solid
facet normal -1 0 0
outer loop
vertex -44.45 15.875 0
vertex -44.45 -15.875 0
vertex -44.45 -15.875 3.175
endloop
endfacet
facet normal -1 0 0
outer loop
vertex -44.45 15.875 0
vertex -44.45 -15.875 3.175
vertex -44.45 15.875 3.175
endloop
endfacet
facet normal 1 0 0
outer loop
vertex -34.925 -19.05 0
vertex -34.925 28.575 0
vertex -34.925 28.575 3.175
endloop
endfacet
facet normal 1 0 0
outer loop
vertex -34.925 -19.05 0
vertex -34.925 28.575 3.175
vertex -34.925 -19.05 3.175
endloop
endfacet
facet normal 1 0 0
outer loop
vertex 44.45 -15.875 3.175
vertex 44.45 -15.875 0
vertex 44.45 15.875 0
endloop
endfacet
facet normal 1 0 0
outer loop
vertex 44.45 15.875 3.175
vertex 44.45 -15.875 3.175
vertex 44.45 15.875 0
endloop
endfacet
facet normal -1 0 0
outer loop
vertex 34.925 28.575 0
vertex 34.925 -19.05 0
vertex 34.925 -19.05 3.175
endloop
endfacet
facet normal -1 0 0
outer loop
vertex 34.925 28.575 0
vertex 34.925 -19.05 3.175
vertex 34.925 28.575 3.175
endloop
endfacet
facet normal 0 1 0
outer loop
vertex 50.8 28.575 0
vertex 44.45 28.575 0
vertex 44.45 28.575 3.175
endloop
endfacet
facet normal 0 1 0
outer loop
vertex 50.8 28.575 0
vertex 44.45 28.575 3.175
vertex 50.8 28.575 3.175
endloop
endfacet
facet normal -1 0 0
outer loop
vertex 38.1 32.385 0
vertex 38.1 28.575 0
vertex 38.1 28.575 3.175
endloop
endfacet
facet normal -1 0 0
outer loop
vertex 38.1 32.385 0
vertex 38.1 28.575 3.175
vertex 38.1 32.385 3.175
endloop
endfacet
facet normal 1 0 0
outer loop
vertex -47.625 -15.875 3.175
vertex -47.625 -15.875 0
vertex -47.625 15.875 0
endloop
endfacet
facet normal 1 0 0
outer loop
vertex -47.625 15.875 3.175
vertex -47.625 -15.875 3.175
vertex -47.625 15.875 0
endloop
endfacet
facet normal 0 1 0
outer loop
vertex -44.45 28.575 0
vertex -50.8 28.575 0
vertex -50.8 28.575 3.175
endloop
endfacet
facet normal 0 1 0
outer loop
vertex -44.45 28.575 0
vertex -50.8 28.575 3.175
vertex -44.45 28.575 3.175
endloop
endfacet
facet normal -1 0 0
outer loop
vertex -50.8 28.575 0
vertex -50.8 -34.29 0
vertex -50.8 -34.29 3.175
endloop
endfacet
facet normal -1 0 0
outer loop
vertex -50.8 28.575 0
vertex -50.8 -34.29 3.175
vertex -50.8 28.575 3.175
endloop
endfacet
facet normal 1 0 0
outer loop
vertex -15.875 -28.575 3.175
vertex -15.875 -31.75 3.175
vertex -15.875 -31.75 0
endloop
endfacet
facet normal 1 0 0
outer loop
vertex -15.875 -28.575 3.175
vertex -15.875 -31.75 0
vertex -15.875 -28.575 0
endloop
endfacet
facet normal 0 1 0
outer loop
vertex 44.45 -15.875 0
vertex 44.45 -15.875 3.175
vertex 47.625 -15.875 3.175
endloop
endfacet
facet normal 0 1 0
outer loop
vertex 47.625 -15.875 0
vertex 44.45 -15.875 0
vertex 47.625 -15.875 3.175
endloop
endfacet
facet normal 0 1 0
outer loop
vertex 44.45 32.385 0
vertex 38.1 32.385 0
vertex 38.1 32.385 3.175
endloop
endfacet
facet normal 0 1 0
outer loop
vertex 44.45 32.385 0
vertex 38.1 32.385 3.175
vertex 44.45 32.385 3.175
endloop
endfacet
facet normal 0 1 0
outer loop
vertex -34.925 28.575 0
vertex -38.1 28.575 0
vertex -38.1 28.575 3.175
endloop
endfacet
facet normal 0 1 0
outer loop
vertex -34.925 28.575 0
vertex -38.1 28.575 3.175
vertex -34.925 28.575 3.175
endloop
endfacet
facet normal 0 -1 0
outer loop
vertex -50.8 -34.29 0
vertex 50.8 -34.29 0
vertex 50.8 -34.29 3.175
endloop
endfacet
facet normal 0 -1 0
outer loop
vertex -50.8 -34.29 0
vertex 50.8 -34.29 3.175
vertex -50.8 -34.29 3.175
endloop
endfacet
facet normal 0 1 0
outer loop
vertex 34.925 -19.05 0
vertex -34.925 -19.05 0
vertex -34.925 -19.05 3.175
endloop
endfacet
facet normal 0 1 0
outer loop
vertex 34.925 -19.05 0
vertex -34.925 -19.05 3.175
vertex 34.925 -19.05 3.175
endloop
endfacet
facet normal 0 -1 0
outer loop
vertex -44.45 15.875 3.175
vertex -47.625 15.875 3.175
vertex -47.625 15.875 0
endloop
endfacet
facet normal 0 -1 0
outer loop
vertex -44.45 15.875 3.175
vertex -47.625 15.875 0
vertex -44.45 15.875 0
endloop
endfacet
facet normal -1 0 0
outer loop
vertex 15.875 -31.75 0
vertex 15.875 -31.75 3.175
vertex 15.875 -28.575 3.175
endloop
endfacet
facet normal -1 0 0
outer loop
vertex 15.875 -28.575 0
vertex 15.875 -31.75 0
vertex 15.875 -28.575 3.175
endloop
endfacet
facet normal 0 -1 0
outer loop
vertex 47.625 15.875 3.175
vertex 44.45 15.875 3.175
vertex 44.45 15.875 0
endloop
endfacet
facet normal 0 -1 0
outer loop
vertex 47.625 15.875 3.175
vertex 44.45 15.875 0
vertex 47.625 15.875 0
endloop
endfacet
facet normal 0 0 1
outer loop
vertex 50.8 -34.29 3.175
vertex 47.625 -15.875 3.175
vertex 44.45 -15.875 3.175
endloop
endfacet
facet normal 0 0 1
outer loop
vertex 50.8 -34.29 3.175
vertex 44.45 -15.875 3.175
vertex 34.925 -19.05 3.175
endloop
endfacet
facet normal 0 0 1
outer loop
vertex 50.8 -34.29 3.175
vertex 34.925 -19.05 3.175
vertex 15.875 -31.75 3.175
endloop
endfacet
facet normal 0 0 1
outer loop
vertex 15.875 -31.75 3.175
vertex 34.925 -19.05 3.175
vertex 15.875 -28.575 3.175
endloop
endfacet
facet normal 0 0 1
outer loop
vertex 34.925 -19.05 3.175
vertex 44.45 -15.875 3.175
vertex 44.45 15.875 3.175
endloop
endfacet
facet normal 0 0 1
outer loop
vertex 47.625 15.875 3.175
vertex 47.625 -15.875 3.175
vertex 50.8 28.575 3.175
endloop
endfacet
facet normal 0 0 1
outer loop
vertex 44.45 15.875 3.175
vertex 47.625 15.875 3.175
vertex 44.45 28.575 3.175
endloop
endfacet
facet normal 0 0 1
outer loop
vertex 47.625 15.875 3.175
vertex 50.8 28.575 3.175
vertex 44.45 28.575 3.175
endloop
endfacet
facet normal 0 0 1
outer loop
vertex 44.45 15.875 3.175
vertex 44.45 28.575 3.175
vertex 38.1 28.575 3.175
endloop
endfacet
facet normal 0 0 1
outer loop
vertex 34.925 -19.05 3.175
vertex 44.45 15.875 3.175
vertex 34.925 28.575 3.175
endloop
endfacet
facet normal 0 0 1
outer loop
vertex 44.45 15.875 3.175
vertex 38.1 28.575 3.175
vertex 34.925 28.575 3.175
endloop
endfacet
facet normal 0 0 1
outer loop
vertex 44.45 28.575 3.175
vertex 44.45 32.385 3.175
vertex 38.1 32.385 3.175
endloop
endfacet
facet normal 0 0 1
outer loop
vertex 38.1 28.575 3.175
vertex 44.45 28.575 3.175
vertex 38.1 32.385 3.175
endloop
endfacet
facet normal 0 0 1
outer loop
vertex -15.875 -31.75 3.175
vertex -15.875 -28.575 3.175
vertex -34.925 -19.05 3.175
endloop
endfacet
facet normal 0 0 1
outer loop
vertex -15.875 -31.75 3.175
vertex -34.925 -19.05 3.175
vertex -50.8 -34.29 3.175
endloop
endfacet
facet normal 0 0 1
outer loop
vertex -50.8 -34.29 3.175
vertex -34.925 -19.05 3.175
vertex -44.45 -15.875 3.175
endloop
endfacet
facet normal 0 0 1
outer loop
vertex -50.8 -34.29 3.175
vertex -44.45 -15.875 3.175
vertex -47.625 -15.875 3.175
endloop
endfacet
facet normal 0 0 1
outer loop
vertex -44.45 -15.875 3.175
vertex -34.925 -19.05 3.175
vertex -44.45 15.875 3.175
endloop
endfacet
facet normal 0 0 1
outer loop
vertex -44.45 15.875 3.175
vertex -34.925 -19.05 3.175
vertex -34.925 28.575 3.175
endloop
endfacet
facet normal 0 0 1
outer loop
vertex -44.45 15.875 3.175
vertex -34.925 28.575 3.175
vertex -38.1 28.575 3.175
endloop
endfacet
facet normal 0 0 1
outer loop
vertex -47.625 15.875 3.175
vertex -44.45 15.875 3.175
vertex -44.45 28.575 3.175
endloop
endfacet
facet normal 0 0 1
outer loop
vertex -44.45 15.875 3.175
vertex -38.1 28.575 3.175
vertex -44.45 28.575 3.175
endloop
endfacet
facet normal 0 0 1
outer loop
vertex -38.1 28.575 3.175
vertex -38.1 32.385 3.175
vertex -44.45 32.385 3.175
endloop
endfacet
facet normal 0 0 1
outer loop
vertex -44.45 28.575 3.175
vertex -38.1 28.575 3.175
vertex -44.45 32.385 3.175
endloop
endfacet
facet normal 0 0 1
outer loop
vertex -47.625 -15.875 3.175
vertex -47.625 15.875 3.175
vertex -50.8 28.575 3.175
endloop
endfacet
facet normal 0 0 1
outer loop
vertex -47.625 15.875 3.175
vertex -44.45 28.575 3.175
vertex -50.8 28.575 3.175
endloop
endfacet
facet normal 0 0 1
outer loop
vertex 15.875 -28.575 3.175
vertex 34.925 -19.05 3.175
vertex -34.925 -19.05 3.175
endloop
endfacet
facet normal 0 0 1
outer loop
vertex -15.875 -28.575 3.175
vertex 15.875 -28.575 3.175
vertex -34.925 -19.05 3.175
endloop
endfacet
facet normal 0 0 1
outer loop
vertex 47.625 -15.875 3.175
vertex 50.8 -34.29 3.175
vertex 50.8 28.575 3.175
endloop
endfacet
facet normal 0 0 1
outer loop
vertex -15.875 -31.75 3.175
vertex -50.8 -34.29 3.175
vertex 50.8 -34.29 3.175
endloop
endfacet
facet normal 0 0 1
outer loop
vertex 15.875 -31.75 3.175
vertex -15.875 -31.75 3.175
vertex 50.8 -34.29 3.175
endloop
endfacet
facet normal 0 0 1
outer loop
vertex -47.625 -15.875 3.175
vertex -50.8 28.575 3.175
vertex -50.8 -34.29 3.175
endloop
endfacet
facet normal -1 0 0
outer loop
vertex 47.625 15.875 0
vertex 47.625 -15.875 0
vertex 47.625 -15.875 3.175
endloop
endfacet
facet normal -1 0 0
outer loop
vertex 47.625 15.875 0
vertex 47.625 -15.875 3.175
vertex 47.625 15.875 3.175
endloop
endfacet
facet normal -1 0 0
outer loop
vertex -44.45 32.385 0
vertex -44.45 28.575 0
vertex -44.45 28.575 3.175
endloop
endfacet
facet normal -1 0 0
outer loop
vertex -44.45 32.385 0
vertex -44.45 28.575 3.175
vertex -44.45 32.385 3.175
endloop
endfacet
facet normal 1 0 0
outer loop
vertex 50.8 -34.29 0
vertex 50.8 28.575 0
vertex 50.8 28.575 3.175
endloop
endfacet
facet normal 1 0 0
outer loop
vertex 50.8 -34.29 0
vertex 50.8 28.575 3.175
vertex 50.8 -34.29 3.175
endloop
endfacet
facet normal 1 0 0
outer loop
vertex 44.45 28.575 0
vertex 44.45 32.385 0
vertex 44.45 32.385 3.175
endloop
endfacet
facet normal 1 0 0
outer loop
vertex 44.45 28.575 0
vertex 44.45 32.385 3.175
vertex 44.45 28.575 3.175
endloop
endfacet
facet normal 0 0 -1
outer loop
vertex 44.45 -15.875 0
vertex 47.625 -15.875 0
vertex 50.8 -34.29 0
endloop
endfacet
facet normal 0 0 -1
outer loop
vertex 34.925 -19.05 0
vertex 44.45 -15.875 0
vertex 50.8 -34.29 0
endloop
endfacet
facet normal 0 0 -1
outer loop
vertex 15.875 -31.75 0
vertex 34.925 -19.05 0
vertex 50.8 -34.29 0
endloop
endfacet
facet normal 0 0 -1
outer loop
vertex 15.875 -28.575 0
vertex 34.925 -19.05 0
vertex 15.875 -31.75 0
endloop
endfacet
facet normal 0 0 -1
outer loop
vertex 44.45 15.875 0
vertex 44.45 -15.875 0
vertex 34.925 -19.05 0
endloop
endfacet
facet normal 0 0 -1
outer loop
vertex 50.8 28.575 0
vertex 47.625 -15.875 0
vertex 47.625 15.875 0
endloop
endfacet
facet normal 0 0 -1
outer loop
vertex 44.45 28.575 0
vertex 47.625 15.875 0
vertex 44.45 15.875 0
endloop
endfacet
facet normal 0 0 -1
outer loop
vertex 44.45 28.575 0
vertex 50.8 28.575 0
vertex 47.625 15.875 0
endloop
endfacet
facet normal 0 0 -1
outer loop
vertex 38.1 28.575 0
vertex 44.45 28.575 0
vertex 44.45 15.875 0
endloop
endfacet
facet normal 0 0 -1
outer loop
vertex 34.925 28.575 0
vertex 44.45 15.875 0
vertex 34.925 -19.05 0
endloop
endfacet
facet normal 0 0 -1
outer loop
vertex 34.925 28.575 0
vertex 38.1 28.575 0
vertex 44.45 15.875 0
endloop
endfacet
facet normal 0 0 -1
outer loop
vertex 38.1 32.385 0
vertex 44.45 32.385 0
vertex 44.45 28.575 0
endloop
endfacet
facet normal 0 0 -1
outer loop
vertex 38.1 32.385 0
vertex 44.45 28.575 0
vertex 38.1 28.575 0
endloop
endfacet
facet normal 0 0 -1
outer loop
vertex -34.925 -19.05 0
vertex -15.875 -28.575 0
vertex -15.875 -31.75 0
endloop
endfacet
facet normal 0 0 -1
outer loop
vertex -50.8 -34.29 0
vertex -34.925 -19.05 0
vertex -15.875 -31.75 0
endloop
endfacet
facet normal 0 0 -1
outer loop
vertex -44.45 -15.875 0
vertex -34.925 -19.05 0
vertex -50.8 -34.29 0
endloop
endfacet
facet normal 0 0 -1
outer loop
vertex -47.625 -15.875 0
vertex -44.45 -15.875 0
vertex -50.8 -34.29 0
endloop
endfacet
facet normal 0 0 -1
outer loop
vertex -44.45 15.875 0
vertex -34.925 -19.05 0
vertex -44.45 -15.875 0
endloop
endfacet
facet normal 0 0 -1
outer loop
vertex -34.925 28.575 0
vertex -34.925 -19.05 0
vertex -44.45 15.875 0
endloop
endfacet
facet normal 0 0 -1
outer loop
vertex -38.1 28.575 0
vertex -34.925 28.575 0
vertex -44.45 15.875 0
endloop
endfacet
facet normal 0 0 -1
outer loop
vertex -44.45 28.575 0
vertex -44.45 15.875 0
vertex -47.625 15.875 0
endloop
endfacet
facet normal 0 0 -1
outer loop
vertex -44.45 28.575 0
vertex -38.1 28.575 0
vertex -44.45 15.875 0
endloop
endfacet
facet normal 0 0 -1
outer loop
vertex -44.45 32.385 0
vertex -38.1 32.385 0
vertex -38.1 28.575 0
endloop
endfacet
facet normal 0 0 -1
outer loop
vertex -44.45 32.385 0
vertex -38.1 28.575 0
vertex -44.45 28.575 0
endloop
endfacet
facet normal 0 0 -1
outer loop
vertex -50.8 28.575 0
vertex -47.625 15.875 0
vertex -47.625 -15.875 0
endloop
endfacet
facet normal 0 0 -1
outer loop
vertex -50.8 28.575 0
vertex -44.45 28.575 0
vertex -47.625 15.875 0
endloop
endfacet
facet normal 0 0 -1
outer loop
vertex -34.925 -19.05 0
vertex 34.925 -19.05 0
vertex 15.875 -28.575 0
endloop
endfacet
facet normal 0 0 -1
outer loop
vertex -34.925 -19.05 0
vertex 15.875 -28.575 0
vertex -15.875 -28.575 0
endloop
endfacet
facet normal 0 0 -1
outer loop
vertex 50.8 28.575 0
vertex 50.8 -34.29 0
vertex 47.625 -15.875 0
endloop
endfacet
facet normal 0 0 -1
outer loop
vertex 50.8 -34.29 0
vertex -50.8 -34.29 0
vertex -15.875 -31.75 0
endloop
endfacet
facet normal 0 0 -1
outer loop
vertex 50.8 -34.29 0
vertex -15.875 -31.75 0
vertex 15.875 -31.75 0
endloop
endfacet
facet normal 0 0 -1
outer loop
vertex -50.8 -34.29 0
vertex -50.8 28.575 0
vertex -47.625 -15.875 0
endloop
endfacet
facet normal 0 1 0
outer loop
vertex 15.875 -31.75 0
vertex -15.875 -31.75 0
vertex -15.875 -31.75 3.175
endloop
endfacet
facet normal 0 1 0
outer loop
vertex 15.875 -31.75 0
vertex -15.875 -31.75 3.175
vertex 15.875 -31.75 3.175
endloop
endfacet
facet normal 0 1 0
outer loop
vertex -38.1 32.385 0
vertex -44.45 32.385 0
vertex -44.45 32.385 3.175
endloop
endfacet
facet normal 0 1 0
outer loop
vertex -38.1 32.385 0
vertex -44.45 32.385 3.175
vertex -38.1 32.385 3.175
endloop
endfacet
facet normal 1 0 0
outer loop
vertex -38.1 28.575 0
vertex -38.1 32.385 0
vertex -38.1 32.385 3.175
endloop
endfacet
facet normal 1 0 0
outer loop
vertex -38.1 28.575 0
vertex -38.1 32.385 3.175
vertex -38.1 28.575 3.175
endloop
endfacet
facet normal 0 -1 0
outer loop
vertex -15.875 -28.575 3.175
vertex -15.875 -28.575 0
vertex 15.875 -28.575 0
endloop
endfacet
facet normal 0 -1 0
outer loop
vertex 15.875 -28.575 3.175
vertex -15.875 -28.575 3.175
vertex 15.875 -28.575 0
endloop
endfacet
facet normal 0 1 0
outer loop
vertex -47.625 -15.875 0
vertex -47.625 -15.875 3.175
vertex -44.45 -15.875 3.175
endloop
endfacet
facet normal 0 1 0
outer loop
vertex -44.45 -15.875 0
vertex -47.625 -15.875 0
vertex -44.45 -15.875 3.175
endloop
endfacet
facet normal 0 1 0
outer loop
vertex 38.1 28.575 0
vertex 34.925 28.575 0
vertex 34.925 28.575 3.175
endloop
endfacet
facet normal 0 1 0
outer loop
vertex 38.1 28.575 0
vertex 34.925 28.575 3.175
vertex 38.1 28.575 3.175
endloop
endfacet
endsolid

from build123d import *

# Parameters (mm, degrees)
SKETCH1_W           = 31.75
SKETCH1_H           = 3.175
SKETCH1_W_2         = 3.175
SKETCH1_H_2         = 31.75
BOSS_EXTRUDE1_DEPTH = 3.175


with BuildPart() as part:
    # Sketch1 → Boss-Extrude1 (new body)
    with BuildSketch(Plane.XY):
        Polygon((-50.8, 28.575), (-44.45, 28.575), (-44.45, 32.385), (-38.1, 32.385), (-38.1, 28.575), (-34.925, 28.575), (-34.925, -19.05), (34.925, -19.05), (34.925, 28.575), (38.1, 28.575), (38.1, 32.385), (44.45, 32.385), (44.45, 28.575), (50.8, 28.575), (50.8, -34.29), (-50.8, -34.29), align=None)
        with Locations((0, -30.1625)):
            Rectangle(SKETCH1_W, SKETCH1_H, mode=Mode.SUBTRACT)
        with Locations((-46.0375, 0)):
            Rectangle(SKETCH1_W_2, SKETCH1_H_2, mode=Mode.SUBTRACT)
        with Locations((46.0375, 0)):
            Rectangle(SKETCH1_W_2, SKETCH1_H_2, mode=Mode.SUBTRACT)
    extrude(amount=BOSS_EXTRUDE1_DEPTH)


solid = part.part
